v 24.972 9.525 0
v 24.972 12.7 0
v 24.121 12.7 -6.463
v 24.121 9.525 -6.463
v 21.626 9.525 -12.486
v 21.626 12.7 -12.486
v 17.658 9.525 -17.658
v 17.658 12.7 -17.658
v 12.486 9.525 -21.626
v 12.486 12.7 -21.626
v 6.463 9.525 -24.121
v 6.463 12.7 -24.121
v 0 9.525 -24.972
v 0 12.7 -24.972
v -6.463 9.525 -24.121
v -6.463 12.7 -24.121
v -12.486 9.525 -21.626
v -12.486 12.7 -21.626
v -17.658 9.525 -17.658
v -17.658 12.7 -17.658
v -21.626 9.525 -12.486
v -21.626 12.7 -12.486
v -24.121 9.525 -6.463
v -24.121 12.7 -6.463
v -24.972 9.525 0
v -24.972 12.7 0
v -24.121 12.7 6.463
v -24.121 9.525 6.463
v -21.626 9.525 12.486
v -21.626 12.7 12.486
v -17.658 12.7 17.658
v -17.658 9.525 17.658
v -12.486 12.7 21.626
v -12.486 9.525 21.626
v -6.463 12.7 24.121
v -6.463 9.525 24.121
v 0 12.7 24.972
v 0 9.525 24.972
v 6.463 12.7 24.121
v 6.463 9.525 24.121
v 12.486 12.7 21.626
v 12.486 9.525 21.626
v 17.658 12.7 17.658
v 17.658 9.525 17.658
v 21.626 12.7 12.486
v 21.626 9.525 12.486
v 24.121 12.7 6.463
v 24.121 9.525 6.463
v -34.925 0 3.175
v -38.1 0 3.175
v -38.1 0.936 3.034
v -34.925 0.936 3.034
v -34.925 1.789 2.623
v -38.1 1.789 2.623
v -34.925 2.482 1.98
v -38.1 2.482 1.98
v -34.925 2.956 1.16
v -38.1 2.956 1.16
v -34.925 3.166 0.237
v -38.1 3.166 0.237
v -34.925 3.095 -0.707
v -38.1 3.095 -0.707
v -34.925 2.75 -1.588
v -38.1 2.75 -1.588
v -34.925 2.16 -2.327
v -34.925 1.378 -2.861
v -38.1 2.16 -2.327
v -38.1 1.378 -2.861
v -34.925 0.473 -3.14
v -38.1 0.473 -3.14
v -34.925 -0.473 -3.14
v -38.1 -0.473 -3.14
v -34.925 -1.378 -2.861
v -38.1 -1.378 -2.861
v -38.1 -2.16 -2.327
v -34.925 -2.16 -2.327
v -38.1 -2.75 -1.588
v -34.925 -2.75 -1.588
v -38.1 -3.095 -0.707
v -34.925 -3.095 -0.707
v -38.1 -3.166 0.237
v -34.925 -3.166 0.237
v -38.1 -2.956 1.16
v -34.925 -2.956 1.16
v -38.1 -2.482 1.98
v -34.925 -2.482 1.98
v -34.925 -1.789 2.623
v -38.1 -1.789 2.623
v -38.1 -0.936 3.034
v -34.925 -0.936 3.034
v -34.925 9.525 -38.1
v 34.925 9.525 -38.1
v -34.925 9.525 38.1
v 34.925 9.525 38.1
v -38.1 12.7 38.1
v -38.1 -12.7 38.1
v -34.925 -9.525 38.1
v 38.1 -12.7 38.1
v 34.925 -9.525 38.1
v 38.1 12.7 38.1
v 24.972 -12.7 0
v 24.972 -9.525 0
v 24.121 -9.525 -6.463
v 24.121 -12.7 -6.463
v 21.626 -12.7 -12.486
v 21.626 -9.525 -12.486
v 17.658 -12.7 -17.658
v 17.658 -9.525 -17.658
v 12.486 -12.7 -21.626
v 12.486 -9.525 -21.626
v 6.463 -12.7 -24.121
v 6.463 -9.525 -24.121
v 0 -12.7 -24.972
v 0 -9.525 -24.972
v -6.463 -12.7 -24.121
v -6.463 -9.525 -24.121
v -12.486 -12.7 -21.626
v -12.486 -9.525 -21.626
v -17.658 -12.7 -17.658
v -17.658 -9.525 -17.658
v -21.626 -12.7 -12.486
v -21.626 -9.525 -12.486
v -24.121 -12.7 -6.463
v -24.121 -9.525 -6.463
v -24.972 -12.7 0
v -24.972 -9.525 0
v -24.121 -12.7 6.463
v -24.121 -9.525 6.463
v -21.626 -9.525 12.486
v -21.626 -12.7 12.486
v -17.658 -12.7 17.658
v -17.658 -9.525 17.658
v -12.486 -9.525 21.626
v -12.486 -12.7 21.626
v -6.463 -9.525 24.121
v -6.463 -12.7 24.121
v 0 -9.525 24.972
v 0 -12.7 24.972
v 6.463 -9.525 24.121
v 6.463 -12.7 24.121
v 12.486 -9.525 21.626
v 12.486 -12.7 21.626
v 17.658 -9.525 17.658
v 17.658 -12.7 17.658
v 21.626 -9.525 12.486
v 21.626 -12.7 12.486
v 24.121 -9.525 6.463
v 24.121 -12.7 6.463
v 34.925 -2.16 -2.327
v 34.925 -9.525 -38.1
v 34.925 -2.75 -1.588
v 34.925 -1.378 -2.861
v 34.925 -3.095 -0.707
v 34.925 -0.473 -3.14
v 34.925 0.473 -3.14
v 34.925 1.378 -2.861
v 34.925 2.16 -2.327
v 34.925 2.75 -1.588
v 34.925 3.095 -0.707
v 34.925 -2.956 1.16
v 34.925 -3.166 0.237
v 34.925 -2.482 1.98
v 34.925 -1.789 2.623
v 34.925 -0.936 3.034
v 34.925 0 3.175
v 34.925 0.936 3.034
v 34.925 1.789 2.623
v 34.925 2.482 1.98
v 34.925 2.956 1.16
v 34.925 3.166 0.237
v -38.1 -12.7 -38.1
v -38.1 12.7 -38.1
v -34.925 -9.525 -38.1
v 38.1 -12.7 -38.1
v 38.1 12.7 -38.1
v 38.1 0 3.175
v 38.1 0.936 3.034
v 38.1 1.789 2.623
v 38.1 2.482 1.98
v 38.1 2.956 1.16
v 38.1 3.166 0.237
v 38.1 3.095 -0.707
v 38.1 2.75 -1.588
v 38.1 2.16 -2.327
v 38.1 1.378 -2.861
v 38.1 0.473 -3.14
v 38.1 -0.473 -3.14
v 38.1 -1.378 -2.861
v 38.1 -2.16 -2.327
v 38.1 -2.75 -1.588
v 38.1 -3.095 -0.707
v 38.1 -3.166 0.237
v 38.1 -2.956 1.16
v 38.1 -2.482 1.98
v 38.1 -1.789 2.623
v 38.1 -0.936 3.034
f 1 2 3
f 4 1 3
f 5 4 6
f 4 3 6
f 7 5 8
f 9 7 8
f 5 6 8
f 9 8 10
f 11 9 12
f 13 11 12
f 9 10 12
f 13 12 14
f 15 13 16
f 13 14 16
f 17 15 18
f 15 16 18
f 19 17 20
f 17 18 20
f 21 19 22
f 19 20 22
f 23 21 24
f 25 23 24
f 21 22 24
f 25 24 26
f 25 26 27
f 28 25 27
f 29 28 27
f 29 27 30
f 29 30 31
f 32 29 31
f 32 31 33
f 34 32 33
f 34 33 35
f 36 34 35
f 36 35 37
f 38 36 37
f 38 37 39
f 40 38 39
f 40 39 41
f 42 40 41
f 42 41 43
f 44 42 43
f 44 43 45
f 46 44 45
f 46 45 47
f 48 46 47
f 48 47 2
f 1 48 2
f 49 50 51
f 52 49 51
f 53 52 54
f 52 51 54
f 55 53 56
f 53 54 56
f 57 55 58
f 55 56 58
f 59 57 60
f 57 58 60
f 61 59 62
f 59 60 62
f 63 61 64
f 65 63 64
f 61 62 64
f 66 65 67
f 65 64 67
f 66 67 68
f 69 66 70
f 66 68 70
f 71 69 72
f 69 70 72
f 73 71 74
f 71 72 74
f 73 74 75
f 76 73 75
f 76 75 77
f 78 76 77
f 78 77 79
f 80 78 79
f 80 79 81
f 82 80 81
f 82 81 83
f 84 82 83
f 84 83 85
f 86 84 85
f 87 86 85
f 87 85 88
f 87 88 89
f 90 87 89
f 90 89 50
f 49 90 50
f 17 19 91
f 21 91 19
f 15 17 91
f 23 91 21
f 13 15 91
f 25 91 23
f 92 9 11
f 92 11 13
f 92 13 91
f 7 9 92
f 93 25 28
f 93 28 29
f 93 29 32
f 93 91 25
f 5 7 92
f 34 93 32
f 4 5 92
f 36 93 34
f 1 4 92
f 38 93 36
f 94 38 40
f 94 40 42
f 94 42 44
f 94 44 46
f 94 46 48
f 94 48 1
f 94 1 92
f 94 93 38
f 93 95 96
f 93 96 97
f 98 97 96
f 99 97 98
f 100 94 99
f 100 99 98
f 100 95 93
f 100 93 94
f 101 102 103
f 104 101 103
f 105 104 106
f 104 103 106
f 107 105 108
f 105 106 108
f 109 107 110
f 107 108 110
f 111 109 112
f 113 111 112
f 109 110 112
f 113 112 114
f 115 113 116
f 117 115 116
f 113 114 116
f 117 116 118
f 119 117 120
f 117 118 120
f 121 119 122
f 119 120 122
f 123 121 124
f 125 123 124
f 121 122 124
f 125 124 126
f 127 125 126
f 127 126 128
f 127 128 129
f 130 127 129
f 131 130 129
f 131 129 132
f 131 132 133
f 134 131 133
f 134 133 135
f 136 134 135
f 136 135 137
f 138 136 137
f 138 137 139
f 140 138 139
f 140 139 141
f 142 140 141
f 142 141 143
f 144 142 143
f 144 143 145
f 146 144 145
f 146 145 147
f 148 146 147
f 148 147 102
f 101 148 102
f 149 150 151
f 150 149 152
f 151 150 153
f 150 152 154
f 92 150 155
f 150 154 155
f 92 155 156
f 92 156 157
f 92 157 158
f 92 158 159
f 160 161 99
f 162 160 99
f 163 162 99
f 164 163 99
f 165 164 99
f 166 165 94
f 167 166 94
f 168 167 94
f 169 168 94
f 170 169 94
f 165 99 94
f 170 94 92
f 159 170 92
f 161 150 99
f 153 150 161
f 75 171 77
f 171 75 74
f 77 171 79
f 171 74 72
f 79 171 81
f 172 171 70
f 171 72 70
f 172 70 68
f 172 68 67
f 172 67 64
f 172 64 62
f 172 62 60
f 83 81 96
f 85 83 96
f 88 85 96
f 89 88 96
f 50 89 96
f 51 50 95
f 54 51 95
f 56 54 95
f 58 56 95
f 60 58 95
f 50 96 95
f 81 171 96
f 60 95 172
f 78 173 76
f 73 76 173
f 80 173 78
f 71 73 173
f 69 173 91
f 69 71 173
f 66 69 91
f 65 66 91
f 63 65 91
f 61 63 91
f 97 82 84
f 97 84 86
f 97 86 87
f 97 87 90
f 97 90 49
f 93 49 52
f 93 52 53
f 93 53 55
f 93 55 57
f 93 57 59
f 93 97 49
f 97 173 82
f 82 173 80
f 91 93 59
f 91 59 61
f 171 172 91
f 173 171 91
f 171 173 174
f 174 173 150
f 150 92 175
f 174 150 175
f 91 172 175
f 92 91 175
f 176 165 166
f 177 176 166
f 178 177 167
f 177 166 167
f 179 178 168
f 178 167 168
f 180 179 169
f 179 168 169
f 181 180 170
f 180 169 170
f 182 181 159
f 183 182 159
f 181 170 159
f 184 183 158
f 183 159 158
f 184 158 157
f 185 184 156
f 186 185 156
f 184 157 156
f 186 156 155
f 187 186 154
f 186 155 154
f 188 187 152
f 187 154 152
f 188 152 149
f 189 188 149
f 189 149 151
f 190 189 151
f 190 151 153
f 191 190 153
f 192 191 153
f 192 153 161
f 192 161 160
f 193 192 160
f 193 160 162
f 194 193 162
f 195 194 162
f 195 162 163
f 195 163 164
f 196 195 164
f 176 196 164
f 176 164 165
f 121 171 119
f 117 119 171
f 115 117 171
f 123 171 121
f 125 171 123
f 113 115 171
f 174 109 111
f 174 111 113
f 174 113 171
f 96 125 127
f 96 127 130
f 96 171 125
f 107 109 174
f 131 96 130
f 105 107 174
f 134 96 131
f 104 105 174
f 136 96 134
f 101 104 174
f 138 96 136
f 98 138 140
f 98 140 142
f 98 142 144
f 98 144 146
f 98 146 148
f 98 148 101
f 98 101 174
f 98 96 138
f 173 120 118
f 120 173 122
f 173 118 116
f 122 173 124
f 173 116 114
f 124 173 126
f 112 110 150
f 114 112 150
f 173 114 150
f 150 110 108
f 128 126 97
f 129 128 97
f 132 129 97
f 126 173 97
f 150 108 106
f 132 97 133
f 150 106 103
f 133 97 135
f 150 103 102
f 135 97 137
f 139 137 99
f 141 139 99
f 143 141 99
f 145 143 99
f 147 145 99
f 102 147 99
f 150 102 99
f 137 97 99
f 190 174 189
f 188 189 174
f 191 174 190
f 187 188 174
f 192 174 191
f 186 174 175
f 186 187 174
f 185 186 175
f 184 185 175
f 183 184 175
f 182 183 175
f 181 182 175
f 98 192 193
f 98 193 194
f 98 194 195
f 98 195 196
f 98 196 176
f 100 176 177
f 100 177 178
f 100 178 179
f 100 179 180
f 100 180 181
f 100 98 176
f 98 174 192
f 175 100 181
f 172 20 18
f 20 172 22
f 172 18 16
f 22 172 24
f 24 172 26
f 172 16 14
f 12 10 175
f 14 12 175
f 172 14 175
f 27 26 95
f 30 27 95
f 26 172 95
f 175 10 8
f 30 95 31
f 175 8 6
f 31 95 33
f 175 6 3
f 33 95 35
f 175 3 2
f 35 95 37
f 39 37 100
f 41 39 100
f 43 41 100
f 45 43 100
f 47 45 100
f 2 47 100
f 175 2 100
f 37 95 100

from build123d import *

# Parameters (mm, degrees)
SKETCH1_W           = 76.2
SKETCH1_H           = 25.4
SKETCH1_W_2         = 69.85
SKETCH1_H_2         = 19.05
EXTRUDE_THIN1_DEPTH = 38.1
SKETCH2_R           = 3.175
CUT_EXTRUDE1_DEPTH  = 77.2
SKETCH3_R           = 24.97201
CUT_EXTRUDE2_DEPTH  = 26.4


with BuildPart() as part:
    # Sketch1 → Extrude-Thin1 (new body, symmetric)
    with BuildSketch(Plane.XY):
        Rectangle(SKETCH1_W, SKETCH1_H)
        Rectangle(SKETCH1_W_2, SKETCH1_H_2, mode=Mode.SUBTRACT)
    extrude(amount=EXTRUDE_THIN1_DEPTH, both=True)

    # Sketch2 → Cut-Extrude1 (cut, through all)
    with BuildSketch(Plane.ZY.offset(38.1)):
        Circle(SKETCH2_R)
    extrude(amount=-CUT_EXTRUDE1_DEPTH, mode=Mode.SUBTRACT)

    # Sketch3 → Cut-Extrude2 (cut, through all)
    with BuildSketch(Plane(origin=(0, 12.7, 0), x_dir=(1, 0, 0), z_dir=(0, 1, 0))):
        Circle(SKETCH3_R)
    extrude(amount=-CUT_EXTRUDE2_DEPTH, mode=Mode.SUBTRACT)


solid = part.part
